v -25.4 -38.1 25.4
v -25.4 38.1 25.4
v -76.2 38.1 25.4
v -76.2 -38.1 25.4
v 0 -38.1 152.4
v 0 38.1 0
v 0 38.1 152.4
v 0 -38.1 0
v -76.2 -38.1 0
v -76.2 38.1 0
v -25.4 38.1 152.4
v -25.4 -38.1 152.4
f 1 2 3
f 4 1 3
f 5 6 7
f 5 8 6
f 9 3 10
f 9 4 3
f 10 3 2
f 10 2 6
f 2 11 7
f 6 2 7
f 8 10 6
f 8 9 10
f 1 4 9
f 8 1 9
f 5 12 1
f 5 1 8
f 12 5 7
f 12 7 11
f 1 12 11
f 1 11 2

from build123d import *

# Parameters (mm, degrees)
F1_DEPTH      = 38.1
F1_DEPTH_BACK = 38.1


with BuildPart() as f1:
    # F0 (on Front) → F1 (new body, two sides)
    with BuildSketch(Plane.XZ) as f1_sk:
        Polygon((0, 0), (0, 152.4), (-25.4, 152.4), (-25.4, 25.4), (-76.2, 25.4), (-76.2, 0), align=None)
    extrude(amount=F1_DEPTH)
    extrude(f1_sk.sketch, amount=-F1_DEPTH_BACK)


solid = f1.part
